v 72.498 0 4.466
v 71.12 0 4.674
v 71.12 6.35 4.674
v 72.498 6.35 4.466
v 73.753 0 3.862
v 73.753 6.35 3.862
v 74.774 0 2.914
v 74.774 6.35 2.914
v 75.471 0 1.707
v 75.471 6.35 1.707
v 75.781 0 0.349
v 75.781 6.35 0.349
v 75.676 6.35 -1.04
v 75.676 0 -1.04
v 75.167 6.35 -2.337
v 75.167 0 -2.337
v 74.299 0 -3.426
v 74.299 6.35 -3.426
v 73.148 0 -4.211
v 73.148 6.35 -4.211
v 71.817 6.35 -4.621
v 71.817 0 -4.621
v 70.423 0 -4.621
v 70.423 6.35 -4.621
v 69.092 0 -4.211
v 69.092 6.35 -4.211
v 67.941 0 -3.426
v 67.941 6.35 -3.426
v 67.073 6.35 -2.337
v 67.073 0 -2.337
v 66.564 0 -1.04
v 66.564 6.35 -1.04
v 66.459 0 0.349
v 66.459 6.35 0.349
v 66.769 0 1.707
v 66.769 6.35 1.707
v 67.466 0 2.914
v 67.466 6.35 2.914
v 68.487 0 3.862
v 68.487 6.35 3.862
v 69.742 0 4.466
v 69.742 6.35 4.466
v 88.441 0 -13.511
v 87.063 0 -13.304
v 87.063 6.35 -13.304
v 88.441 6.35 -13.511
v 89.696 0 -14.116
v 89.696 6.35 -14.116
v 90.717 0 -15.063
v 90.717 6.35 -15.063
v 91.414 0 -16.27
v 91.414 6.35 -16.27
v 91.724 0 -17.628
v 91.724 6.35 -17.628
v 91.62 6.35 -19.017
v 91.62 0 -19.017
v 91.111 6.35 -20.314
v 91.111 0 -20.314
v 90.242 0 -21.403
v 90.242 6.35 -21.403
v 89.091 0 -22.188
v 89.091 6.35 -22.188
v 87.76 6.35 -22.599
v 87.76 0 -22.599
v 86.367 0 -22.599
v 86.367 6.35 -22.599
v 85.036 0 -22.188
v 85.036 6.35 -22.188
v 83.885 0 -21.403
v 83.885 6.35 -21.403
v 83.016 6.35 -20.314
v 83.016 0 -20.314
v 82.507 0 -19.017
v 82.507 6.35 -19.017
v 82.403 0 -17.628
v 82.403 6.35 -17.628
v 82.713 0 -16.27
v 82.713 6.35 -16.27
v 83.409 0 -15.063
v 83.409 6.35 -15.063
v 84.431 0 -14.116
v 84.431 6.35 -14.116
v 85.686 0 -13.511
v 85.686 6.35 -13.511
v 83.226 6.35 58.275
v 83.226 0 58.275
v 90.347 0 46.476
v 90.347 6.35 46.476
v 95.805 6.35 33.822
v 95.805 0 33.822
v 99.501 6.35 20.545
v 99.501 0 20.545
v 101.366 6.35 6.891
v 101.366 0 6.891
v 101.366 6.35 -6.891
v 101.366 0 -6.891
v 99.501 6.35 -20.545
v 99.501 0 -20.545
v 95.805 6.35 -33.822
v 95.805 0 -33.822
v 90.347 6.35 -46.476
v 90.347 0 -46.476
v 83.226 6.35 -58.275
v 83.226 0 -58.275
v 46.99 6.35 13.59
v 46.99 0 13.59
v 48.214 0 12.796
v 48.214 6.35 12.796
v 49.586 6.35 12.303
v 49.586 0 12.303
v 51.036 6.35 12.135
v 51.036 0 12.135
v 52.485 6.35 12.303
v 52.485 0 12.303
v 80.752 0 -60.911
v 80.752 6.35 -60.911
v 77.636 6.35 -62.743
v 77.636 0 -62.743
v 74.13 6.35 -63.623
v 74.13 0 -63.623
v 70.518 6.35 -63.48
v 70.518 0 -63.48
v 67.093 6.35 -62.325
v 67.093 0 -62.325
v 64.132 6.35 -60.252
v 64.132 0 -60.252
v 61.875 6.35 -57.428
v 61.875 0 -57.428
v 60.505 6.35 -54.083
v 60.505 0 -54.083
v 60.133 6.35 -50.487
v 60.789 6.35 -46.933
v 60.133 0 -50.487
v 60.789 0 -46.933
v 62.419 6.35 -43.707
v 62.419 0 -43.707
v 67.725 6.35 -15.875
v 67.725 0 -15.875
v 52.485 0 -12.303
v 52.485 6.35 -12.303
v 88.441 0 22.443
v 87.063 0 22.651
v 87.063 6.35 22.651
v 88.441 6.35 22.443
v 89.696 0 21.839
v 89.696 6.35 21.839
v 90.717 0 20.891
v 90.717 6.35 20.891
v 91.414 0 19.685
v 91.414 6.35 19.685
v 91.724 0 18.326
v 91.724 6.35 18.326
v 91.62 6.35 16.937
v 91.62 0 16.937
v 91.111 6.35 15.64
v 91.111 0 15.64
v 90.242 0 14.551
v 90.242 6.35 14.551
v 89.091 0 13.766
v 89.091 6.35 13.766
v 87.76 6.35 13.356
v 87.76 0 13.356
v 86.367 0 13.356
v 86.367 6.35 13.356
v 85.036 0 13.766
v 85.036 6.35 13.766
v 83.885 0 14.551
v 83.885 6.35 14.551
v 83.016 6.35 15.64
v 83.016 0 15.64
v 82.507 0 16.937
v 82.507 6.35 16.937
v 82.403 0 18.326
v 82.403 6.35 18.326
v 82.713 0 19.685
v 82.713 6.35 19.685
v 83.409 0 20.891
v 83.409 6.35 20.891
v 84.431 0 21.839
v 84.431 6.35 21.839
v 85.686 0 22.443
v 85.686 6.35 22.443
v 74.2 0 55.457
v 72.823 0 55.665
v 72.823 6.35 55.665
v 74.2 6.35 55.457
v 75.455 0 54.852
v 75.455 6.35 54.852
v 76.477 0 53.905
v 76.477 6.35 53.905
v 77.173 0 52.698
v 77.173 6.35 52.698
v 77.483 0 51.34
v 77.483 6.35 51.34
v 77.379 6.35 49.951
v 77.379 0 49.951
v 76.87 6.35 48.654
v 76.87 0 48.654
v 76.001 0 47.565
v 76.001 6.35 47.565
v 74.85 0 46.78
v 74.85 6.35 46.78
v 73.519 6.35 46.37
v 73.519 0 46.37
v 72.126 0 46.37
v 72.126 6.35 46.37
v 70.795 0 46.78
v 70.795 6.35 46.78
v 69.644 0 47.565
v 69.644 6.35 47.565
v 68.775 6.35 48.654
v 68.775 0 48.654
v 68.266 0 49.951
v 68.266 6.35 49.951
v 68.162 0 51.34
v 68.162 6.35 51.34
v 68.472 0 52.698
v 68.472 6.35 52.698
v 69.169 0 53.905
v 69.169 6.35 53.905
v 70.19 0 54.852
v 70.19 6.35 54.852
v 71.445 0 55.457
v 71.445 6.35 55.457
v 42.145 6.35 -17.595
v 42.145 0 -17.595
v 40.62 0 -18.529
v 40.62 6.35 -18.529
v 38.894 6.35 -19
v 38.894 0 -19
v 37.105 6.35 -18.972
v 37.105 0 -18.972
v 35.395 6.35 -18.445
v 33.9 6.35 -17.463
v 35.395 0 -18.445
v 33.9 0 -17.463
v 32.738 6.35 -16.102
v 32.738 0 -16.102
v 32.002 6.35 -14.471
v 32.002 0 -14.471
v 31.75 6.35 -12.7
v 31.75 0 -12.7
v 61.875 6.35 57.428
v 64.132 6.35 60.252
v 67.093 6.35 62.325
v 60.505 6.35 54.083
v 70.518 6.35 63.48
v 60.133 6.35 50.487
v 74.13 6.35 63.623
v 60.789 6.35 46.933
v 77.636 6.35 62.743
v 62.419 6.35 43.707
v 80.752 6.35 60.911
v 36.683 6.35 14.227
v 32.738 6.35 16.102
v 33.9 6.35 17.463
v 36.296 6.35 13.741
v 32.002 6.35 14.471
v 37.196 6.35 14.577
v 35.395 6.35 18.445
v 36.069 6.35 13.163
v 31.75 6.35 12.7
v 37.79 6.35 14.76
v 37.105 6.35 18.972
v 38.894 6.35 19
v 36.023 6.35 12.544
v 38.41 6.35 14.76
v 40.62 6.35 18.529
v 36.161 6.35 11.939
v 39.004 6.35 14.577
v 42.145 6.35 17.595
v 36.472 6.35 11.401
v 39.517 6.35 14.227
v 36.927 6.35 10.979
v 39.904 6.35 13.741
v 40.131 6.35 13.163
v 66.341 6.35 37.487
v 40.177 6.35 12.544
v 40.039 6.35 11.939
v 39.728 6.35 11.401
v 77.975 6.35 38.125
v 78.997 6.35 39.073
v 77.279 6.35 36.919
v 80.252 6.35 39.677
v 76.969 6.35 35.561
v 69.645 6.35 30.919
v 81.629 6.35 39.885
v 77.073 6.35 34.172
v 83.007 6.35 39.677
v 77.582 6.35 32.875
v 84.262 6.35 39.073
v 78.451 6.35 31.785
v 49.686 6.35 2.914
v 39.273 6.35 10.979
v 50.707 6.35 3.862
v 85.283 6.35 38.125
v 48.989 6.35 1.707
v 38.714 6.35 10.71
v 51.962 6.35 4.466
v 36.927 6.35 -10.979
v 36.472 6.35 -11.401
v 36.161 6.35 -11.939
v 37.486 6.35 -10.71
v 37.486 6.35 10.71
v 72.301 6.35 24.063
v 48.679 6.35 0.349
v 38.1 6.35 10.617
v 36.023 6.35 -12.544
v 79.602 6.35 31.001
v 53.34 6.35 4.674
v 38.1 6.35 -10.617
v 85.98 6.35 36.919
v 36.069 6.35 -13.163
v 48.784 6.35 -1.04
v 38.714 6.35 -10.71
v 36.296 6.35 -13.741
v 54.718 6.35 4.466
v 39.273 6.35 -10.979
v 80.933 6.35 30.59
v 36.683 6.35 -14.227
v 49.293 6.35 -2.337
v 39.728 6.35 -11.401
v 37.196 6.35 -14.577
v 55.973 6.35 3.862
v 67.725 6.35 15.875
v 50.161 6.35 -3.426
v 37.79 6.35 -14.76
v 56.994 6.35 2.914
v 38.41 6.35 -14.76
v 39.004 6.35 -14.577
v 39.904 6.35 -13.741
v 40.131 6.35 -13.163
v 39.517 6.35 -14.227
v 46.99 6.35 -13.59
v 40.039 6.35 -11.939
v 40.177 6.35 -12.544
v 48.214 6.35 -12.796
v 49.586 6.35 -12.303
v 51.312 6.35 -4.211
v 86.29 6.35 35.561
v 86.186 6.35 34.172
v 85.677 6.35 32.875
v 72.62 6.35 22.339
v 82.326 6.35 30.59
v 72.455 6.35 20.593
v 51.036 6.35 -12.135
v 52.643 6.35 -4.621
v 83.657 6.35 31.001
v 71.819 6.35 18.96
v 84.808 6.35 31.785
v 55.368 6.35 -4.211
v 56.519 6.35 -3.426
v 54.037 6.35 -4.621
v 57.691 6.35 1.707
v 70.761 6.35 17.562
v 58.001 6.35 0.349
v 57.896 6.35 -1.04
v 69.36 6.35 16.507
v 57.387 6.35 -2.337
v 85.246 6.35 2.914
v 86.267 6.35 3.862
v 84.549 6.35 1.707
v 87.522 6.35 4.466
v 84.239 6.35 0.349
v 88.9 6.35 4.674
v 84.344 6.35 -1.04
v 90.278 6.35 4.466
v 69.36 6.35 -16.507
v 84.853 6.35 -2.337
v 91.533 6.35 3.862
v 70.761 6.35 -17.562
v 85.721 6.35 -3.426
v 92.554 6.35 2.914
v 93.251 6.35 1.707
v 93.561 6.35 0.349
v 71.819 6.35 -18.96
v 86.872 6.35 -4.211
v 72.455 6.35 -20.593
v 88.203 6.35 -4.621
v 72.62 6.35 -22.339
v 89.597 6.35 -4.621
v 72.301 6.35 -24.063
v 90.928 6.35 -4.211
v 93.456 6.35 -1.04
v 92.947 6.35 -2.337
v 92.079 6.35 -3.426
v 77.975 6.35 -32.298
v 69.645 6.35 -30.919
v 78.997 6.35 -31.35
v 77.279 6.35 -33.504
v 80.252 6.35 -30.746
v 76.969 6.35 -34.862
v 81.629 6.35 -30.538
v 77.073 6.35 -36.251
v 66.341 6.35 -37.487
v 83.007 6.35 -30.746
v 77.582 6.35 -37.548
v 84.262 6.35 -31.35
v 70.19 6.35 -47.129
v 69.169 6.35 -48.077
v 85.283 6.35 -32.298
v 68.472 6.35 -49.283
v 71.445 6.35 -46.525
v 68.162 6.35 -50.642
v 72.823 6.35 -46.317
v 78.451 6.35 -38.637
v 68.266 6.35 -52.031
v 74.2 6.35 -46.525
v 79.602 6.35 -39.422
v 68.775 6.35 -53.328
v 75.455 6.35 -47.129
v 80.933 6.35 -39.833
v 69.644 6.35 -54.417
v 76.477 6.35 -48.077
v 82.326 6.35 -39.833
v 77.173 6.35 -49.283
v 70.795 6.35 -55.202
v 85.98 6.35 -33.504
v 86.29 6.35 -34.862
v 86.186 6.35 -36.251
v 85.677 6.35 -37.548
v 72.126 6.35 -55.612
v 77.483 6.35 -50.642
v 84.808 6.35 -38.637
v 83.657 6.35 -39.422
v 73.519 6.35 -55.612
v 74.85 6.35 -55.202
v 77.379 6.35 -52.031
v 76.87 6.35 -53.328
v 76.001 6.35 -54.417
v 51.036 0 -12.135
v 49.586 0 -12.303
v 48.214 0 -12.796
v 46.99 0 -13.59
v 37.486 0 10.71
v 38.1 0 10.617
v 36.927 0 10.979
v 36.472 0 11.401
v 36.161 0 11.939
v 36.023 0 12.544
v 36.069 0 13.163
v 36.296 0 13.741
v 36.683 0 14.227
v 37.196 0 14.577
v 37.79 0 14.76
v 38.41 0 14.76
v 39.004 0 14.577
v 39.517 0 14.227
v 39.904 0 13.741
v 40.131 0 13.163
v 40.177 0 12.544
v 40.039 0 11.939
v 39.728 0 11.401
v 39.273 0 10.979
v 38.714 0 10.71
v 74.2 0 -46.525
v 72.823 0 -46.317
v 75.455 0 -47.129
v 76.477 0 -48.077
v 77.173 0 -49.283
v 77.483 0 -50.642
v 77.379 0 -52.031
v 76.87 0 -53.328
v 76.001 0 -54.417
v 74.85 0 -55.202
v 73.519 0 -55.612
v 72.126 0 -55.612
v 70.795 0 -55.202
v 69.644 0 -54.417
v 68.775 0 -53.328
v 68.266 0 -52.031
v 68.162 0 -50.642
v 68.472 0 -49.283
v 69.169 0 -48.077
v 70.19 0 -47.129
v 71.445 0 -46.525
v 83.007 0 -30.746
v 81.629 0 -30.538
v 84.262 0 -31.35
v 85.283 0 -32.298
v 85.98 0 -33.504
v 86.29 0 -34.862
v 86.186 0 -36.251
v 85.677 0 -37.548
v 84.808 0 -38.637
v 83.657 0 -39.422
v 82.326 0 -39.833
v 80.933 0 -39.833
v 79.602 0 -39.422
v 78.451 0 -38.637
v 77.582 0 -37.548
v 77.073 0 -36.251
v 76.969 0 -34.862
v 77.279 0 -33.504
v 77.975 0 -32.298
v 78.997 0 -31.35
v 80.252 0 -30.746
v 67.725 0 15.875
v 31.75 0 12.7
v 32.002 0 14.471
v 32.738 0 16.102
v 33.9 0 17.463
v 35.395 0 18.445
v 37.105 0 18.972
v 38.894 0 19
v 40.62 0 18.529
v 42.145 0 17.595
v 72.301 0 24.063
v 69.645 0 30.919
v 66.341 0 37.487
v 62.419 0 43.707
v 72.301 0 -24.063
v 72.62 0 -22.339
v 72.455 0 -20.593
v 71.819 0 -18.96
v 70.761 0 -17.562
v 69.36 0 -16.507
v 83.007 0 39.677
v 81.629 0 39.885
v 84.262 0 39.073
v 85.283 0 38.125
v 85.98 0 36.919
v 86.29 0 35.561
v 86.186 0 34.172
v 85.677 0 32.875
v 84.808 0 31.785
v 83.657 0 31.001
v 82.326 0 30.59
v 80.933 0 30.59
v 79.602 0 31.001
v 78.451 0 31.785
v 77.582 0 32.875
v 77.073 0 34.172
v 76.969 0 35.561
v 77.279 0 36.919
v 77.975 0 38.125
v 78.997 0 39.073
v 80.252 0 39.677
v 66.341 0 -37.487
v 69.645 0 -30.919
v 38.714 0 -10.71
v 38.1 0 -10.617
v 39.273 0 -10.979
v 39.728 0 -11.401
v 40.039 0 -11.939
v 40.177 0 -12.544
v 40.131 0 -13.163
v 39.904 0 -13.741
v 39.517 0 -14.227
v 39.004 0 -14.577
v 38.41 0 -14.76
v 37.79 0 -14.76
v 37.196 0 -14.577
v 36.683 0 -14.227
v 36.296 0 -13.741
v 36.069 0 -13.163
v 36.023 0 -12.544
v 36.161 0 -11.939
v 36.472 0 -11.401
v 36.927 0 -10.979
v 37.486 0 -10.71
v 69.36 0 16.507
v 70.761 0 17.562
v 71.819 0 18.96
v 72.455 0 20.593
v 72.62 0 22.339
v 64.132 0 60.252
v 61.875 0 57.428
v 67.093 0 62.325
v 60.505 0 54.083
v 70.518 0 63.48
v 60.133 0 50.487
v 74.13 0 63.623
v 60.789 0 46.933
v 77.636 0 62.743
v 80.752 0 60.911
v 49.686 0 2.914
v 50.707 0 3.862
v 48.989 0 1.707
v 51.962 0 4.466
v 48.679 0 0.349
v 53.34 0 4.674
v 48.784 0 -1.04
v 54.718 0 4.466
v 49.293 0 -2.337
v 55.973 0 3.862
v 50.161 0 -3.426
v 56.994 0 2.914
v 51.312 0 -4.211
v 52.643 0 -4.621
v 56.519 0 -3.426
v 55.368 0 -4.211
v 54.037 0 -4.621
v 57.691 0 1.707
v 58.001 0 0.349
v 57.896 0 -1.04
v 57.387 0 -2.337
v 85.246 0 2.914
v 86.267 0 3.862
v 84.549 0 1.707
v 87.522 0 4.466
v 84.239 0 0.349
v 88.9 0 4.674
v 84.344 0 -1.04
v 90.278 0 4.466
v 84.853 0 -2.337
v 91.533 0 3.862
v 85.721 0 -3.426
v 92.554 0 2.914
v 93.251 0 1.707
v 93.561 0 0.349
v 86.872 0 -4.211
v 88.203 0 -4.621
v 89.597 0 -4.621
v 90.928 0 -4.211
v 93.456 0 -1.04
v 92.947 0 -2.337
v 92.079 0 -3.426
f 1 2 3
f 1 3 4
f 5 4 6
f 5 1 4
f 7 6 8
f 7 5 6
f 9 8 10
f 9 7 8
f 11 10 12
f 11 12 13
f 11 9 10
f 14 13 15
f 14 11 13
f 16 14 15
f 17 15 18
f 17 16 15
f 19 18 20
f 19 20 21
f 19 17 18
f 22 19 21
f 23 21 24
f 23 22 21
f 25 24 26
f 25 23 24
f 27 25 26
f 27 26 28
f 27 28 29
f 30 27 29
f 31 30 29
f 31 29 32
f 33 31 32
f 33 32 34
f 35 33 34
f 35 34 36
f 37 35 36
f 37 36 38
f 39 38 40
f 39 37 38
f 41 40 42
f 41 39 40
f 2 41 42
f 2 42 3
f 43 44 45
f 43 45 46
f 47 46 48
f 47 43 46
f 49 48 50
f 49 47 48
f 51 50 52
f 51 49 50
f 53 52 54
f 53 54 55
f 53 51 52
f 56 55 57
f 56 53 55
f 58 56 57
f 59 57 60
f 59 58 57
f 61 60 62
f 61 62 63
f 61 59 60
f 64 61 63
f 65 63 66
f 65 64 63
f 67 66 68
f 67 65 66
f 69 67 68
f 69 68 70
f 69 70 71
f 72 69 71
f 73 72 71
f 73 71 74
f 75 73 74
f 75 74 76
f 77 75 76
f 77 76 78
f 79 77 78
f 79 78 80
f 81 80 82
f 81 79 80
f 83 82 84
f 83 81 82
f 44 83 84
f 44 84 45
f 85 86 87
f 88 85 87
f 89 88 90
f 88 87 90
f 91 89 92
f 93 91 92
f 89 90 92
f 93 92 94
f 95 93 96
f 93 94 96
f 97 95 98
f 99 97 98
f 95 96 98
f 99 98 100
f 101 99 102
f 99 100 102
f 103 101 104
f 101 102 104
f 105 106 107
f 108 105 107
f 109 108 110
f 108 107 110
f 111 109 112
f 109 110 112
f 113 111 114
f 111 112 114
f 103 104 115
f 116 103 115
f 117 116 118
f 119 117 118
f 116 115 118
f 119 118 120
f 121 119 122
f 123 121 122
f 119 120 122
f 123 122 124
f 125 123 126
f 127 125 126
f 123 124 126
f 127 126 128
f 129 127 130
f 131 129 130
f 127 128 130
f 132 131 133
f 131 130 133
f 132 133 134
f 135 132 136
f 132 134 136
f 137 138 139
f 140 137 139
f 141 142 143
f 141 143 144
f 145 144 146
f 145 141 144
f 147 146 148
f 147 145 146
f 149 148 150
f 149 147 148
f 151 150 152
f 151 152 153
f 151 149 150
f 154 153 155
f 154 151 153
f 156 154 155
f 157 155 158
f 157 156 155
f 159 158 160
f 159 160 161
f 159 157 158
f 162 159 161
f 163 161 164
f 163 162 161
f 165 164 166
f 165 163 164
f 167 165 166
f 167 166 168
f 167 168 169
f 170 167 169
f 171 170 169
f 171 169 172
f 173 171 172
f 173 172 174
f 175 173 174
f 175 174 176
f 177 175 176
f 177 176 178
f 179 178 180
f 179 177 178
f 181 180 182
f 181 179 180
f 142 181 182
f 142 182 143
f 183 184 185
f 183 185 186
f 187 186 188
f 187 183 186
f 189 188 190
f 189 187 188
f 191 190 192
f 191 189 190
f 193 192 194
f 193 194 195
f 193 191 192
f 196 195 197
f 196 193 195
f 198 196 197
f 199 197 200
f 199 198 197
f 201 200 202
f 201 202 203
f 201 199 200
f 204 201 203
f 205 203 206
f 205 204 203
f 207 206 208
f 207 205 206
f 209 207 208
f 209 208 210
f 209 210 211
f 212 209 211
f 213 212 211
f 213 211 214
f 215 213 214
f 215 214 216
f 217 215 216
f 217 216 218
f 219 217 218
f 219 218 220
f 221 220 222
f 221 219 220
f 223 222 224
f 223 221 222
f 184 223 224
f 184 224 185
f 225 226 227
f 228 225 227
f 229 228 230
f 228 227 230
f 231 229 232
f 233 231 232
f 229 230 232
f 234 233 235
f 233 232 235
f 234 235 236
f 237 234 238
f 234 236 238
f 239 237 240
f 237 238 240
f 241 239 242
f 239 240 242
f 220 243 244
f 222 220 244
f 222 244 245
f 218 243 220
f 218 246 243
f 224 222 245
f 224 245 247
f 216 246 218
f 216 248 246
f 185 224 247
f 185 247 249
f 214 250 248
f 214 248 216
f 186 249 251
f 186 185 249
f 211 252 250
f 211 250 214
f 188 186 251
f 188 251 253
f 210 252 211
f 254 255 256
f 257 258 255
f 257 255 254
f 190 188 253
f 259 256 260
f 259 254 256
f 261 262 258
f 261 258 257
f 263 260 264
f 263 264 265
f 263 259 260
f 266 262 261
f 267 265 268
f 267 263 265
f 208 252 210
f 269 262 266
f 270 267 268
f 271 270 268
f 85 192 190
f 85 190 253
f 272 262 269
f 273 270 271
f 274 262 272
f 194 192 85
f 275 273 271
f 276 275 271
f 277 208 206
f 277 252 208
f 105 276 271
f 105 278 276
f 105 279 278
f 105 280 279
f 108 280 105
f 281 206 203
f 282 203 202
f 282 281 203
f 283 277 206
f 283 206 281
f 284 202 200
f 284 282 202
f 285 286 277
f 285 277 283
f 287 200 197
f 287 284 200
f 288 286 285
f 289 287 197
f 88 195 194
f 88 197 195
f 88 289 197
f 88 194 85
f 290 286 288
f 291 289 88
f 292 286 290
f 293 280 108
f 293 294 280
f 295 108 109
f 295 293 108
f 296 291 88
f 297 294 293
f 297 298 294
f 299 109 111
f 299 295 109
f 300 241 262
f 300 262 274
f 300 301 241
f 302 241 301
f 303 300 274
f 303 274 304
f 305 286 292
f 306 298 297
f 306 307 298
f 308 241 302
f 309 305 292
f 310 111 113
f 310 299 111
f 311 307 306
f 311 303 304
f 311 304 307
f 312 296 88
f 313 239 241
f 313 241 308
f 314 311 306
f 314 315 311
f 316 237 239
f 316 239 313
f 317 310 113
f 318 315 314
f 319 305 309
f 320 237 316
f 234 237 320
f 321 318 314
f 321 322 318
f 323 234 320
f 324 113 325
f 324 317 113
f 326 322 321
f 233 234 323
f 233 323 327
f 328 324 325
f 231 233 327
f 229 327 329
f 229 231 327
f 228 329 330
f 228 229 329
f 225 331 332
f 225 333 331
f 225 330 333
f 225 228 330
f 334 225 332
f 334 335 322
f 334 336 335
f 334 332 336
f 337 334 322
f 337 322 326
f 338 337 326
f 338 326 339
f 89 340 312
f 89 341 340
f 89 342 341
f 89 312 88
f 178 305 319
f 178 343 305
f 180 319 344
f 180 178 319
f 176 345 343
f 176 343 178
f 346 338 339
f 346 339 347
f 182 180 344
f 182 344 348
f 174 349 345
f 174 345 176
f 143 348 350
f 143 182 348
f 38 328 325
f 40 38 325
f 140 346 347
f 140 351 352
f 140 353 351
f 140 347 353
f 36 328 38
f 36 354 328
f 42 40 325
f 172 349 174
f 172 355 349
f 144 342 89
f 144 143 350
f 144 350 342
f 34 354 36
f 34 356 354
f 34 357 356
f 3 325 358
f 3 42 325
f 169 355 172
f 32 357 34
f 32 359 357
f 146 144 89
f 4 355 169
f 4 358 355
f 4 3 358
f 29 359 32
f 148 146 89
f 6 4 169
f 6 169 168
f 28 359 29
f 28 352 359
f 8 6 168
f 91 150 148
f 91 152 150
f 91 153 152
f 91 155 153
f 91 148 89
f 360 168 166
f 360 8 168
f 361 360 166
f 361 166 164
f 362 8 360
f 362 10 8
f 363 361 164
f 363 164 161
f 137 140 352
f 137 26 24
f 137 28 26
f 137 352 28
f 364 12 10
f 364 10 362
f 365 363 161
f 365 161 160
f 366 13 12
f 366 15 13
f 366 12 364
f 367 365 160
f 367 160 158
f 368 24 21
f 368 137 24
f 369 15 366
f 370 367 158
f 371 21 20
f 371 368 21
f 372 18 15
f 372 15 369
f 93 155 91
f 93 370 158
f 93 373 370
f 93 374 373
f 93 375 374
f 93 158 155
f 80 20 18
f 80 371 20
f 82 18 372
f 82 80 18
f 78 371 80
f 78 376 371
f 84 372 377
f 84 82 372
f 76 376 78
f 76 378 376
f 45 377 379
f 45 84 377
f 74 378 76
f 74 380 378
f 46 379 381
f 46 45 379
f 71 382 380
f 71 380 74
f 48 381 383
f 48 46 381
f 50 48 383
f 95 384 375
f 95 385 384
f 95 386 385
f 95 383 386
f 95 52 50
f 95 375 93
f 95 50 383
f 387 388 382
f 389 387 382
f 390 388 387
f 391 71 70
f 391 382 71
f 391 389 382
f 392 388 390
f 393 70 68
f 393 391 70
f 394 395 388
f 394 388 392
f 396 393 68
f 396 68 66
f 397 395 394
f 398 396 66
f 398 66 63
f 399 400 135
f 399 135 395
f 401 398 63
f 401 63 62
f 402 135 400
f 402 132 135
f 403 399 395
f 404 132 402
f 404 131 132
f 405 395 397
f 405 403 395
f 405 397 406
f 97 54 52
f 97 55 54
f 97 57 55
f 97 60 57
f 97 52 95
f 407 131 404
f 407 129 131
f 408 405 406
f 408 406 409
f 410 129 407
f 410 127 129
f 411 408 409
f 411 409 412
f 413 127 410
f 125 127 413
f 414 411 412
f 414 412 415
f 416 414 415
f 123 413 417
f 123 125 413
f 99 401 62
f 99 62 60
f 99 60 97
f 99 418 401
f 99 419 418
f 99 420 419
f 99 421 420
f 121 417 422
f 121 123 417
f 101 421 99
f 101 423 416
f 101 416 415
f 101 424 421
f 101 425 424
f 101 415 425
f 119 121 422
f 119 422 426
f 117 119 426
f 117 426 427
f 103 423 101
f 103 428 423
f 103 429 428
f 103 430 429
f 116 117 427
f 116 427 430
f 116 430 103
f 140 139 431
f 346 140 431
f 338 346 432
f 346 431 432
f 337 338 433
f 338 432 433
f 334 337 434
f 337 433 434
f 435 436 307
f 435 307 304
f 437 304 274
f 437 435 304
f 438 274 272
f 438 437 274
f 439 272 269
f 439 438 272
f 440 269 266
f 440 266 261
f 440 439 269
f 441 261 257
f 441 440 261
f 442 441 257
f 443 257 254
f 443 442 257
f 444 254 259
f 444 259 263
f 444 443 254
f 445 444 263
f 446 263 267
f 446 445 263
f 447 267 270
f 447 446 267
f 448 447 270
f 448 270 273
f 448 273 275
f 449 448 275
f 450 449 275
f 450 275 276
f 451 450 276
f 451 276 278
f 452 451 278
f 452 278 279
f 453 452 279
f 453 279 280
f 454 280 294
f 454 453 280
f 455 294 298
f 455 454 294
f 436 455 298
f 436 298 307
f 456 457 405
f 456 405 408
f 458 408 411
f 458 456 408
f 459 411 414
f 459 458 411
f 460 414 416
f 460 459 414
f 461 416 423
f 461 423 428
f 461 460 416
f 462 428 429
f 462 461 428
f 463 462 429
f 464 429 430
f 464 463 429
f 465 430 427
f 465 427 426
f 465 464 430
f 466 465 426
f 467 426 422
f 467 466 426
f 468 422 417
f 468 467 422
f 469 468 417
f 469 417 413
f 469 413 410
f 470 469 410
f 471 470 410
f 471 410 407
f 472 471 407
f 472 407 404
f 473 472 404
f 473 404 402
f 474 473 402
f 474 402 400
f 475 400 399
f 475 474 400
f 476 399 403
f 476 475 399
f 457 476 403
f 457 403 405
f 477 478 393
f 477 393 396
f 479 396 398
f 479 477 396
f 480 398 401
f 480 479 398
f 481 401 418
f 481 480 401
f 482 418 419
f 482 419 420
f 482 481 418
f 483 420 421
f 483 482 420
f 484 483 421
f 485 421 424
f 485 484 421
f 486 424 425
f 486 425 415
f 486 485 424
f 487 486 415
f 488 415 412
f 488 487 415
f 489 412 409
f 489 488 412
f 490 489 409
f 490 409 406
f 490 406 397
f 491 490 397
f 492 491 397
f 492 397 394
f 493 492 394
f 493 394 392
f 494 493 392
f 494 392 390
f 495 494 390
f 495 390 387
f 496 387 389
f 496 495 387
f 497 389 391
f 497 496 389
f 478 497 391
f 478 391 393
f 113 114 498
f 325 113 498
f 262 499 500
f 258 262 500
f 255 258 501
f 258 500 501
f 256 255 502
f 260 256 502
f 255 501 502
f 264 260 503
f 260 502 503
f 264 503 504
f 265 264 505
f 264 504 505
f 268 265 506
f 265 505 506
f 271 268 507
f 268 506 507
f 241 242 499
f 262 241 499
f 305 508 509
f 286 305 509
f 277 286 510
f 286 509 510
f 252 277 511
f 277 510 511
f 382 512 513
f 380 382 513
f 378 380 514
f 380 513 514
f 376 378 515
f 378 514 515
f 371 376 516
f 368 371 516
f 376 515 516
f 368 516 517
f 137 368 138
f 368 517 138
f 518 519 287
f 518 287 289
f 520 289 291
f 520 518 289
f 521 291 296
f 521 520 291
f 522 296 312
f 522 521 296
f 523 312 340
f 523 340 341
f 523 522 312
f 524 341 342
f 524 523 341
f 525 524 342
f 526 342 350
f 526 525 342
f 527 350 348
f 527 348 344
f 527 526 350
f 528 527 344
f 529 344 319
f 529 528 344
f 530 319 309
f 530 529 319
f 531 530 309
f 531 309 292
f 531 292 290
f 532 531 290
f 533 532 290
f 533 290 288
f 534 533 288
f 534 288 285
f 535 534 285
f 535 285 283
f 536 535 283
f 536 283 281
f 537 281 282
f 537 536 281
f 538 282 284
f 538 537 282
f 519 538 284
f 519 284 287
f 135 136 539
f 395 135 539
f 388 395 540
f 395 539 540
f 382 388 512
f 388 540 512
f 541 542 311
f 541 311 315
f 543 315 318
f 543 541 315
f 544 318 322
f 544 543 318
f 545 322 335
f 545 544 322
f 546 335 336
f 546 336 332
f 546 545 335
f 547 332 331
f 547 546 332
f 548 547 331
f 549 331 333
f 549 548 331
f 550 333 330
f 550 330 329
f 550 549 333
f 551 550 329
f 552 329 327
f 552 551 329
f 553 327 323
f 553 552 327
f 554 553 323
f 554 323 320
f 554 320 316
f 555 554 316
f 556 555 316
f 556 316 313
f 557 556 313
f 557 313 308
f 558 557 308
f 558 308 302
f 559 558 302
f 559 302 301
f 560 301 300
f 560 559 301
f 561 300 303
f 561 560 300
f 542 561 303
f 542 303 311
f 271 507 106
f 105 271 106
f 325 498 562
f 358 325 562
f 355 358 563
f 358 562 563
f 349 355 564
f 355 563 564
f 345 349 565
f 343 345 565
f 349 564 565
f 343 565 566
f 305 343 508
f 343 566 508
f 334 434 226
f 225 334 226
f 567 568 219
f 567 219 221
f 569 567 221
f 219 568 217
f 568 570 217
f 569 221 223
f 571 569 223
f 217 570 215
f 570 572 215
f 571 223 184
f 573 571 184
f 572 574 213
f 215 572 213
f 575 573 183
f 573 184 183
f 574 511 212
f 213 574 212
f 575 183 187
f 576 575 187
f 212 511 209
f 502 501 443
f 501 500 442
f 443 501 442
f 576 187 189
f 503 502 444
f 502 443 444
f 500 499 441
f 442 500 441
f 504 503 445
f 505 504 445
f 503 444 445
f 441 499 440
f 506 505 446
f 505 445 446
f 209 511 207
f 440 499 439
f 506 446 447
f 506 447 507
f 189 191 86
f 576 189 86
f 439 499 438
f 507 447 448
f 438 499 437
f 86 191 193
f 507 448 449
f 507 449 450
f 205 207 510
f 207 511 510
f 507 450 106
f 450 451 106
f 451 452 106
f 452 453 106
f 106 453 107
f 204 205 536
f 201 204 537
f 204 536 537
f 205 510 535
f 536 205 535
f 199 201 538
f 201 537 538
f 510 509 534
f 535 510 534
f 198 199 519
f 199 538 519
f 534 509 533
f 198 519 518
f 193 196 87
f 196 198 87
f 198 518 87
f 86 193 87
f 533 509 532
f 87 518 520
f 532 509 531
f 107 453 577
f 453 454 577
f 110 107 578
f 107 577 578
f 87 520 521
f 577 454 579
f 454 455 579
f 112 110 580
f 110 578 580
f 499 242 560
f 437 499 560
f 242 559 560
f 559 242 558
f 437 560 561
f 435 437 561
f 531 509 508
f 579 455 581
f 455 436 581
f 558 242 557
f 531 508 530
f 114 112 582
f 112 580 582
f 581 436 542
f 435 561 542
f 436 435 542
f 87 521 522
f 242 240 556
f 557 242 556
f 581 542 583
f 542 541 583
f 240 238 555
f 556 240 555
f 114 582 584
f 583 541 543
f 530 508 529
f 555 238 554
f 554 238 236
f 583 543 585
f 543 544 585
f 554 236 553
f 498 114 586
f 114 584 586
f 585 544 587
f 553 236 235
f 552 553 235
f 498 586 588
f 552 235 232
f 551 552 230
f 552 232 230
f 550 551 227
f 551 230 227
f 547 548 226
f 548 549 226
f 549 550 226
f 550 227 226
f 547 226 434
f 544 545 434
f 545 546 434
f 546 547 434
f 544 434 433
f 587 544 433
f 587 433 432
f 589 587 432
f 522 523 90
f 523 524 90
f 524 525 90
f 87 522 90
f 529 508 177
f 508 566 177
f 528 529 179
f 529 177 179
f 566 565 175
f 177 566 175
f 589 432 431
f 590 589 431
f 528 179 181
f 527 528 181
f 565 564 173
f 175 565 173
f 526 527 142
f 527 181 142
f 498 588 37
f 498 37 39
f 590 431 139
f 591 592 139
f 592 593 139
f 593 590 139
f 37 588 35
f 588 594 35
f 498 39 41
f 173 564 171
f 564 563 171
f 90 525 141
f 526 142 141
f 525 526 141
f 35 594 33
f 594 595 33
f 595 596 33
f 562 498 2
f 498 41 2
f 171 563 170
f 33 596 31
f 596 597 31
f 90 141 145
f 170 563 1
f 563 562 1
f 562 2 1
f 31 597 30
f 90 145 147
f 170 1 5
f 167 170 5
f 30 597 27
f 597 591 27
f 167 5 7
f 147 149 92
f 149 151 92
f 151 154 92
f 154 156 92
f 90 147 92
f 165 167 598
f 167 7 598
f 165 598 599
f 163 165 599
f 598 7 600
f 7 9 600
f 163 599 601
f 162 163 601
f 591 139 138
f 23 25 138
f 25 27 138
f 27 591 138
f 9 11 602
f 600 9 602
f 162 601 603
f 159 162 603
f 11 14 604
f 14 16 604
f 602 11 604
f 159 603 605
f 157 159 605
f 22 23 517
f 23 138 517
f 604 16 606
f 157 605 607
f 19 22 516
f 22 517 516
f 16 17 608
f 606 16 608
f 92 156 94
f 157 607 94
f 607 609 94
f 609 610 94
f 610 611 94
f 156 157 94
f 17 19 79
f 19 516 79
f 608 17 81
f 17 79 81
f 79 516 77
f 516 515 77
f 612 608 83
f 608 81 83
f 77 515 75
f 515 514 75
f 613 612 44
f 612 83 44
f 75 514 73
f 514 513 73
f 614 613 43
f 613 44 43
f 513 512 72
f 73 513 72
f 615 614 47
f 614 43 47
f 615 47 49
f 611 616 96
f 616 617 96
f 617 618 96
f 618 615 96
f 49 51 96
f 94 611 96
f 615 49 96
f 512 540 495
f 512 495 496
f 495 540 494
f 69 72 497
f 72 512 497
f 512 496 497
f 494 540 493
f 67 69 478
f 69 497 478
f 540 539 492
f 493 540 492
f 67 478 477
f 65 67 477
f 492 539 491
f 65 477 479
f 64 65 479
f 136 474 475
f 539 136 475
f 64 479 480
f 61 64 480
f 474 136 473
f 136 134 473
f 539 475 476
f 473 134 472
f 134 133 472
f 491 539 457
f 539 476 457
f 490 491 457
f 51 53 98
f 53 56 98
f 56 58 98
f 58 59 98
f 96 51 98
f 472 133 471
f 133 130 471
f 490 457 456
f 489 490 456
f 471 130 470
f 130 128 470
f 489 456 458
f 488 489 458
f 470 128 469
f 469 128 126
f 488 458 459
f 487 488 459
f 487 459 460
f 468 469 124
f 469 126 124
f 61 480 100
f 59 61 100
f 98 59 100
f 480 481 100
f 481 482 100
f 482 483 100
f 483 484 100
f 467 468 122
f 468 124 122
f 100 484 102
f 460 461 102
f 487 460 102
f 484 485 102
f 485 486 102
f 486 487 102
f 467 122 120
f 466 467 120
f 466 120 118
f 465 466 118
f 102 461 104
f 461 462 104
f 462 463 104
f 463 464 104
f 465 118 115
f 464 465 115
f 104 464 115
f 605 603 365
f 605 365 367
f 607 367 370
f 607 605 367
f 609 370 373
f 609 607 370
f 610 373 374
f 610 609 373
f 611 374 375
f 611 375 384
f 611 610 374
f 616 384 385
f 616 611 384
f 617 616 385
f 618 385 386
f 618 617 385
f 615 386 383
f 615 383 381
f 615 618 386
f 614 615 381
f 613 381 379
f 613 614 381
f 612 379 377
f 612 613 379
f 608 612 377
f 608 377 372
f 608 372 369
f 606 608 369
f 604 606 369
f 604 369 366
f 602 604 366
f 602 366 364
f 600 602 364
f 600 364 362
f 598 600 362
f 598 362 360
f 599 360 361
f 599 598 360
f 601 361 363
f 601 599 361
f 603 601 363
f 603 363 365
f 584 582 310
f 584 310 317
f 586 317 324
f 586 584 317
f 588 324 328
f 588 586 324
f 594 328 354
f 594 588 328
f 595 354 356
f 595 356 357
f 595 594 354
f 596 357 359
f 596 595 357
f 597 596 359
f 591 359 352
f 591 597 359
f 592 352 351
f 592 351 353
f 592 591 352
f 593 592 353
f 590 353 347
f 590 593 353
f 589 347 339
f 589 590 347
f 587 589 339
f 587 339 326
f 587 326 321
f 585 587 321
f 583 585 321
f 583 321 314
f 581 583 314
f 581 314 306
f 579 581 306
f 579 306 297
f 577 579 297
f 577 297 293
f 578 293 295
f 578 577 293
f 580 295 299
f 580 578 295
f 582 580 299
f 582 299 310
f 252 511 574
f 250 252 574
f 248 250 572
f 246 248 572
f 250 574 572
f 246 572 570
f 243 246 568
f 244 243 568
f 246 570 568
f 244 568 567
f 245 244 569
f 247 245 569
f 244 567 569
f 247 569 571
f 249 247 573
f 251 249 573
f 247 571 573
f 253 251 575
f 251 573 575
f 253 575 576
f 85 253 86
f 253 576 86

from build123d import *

# Parameters (mm, degrees)
SKETCH1_R           = 2.0828
SKETCH1_R_2         = 4.6736
BOSS_EXTRUDE1_DEPTH = 6.35


with BuildPart() as part:
    # Sketch1 → Boss-Extrude1 (new body)
    with BuildSketch(Plane(origin=(0, 0, 0), x_dir=(1, 0, 0), z_dir=(0, 1, 0))):
        with BuildLine():
            Line((67.725064599, 15.875), (52.484642113, 12.302589868))
            ThreePointArc((52.484642113, 12.302589868), (49.586387593, 12.302563925), (46.99, 13.590450074))
            Line((46.99, 13.590450074), (42.145459513, 17.594564059))
            ThreePointArc((42.145459513, 17.594564059), (35.395020139, 18.445048647), (31.75, 12.7))
            Line((31.75, 12.7), (31.75, -12.7))
            ThreePointArc((31.75, -12.7), (35.395020139, -18.445048647), (42.145459513, -17.594564059))
            Line((42.145459513, -17.594564059), (46.99, -13.590450074))
            ThreePointArc((46.99, -13.590450074), (49.586387593, -12.302563925), (52.484642113, -12.302589868))
            Line((52.484642113, -12.302589868), (67.725064599, -15.875))
            ThreePointArc((67.725064599, -15.875), (71.818943633, -18.959526957), (72.300962181, -24.062644653))
            ThreePointArc((72.300962181, -24.062644653), (68.072487407, -34.242903765), (62.419385775, -43.70652445))
            ThreePointArc((62.419385775, -43.70652445), (65.538195996, -61.394176154), (83.2258477, -58.275365933))
            ThreePointArc((83.2258477, -58.275365933), (101.6, 0), (83.2258477, 58.275365933))
            ThreePointArc((83.2258477, 58.275365933), (65.538195996, 61.394176154), (62.419385775, 43.70652445))
            ThreePointArc((62.419385775, 43.70652445), (68.072487407, 34.242903765), (72.300962181, 24.062644653))
            ThreePointArc((72.300962181, 24.062644653), (71.818943633, 18.959526957), (67.725064599, 15.875))
        make_face()
        with Locations(Location((38.1, 12.7, 0), (0, 0, 270))):
            Circle(SKETCH1_R, mode=Mode.SUBTRACT)
        with Locations(Location((88.9, 0, 0), (0, 0, 270))):
            Circle(SKETCH1_R_2, mode=Mode.SUBTRACT)
        with Locations(Location((87.063381275, -17.97714218, 0), (0, 0, 270))):
            Circle(SKETCH1_R_2, mode=Mode.SUBTRACT)
        with Locations(Location((81.629411902, -35.211491201, 0), (0, 0, 270))):
            Circle(SKETCH1_R_2, mode=Mode.SUBTRACT)
        with Locations(Location((72.822616737, -50.990945192, 0), (0, 0, 270))):
            Circle(SKETCH1_R_2, mode=Mode.SUBTRACT)
        with Locations(Location((87.063381275, 17.97714218, 0), (0, 0, 270))):
            Circle(SKETCH1_R_2, mode=Mode.SUBTRACT)
        with Locations(Location((81.629411902, 35.211491201, 0), (0, 0, 270))):
            Circle(SKETCH1_R_2, mode=Mode.SUBTRACT)
        with Locations(Location((72.822616737, 50.990945192, 0), (0, 0, 270))):
            Circle(SKETCH1_R_2, mode=Mode.SUBTRACT)
        with Locations(Location((71.12, 0, 0), (0, 0, 270))):
            Circle(SKETCH1_R_2, mode=Mode.SUBTRACT)
        with Locations(Location((53.34, 0, 0), (0, 0, 270))):
            Circle(SKETCH1_R_2, mode=Mode.SUBTRACT)
        with Locations(Location((38.1, -12.7, 0), (0, 0, 90))):
            Circle(SKETCH1_R, mode=Mode.SUBTRACT)
    extrude(amount=BOSS_EXTRUDE1_DEPTH)


solid = part.part
